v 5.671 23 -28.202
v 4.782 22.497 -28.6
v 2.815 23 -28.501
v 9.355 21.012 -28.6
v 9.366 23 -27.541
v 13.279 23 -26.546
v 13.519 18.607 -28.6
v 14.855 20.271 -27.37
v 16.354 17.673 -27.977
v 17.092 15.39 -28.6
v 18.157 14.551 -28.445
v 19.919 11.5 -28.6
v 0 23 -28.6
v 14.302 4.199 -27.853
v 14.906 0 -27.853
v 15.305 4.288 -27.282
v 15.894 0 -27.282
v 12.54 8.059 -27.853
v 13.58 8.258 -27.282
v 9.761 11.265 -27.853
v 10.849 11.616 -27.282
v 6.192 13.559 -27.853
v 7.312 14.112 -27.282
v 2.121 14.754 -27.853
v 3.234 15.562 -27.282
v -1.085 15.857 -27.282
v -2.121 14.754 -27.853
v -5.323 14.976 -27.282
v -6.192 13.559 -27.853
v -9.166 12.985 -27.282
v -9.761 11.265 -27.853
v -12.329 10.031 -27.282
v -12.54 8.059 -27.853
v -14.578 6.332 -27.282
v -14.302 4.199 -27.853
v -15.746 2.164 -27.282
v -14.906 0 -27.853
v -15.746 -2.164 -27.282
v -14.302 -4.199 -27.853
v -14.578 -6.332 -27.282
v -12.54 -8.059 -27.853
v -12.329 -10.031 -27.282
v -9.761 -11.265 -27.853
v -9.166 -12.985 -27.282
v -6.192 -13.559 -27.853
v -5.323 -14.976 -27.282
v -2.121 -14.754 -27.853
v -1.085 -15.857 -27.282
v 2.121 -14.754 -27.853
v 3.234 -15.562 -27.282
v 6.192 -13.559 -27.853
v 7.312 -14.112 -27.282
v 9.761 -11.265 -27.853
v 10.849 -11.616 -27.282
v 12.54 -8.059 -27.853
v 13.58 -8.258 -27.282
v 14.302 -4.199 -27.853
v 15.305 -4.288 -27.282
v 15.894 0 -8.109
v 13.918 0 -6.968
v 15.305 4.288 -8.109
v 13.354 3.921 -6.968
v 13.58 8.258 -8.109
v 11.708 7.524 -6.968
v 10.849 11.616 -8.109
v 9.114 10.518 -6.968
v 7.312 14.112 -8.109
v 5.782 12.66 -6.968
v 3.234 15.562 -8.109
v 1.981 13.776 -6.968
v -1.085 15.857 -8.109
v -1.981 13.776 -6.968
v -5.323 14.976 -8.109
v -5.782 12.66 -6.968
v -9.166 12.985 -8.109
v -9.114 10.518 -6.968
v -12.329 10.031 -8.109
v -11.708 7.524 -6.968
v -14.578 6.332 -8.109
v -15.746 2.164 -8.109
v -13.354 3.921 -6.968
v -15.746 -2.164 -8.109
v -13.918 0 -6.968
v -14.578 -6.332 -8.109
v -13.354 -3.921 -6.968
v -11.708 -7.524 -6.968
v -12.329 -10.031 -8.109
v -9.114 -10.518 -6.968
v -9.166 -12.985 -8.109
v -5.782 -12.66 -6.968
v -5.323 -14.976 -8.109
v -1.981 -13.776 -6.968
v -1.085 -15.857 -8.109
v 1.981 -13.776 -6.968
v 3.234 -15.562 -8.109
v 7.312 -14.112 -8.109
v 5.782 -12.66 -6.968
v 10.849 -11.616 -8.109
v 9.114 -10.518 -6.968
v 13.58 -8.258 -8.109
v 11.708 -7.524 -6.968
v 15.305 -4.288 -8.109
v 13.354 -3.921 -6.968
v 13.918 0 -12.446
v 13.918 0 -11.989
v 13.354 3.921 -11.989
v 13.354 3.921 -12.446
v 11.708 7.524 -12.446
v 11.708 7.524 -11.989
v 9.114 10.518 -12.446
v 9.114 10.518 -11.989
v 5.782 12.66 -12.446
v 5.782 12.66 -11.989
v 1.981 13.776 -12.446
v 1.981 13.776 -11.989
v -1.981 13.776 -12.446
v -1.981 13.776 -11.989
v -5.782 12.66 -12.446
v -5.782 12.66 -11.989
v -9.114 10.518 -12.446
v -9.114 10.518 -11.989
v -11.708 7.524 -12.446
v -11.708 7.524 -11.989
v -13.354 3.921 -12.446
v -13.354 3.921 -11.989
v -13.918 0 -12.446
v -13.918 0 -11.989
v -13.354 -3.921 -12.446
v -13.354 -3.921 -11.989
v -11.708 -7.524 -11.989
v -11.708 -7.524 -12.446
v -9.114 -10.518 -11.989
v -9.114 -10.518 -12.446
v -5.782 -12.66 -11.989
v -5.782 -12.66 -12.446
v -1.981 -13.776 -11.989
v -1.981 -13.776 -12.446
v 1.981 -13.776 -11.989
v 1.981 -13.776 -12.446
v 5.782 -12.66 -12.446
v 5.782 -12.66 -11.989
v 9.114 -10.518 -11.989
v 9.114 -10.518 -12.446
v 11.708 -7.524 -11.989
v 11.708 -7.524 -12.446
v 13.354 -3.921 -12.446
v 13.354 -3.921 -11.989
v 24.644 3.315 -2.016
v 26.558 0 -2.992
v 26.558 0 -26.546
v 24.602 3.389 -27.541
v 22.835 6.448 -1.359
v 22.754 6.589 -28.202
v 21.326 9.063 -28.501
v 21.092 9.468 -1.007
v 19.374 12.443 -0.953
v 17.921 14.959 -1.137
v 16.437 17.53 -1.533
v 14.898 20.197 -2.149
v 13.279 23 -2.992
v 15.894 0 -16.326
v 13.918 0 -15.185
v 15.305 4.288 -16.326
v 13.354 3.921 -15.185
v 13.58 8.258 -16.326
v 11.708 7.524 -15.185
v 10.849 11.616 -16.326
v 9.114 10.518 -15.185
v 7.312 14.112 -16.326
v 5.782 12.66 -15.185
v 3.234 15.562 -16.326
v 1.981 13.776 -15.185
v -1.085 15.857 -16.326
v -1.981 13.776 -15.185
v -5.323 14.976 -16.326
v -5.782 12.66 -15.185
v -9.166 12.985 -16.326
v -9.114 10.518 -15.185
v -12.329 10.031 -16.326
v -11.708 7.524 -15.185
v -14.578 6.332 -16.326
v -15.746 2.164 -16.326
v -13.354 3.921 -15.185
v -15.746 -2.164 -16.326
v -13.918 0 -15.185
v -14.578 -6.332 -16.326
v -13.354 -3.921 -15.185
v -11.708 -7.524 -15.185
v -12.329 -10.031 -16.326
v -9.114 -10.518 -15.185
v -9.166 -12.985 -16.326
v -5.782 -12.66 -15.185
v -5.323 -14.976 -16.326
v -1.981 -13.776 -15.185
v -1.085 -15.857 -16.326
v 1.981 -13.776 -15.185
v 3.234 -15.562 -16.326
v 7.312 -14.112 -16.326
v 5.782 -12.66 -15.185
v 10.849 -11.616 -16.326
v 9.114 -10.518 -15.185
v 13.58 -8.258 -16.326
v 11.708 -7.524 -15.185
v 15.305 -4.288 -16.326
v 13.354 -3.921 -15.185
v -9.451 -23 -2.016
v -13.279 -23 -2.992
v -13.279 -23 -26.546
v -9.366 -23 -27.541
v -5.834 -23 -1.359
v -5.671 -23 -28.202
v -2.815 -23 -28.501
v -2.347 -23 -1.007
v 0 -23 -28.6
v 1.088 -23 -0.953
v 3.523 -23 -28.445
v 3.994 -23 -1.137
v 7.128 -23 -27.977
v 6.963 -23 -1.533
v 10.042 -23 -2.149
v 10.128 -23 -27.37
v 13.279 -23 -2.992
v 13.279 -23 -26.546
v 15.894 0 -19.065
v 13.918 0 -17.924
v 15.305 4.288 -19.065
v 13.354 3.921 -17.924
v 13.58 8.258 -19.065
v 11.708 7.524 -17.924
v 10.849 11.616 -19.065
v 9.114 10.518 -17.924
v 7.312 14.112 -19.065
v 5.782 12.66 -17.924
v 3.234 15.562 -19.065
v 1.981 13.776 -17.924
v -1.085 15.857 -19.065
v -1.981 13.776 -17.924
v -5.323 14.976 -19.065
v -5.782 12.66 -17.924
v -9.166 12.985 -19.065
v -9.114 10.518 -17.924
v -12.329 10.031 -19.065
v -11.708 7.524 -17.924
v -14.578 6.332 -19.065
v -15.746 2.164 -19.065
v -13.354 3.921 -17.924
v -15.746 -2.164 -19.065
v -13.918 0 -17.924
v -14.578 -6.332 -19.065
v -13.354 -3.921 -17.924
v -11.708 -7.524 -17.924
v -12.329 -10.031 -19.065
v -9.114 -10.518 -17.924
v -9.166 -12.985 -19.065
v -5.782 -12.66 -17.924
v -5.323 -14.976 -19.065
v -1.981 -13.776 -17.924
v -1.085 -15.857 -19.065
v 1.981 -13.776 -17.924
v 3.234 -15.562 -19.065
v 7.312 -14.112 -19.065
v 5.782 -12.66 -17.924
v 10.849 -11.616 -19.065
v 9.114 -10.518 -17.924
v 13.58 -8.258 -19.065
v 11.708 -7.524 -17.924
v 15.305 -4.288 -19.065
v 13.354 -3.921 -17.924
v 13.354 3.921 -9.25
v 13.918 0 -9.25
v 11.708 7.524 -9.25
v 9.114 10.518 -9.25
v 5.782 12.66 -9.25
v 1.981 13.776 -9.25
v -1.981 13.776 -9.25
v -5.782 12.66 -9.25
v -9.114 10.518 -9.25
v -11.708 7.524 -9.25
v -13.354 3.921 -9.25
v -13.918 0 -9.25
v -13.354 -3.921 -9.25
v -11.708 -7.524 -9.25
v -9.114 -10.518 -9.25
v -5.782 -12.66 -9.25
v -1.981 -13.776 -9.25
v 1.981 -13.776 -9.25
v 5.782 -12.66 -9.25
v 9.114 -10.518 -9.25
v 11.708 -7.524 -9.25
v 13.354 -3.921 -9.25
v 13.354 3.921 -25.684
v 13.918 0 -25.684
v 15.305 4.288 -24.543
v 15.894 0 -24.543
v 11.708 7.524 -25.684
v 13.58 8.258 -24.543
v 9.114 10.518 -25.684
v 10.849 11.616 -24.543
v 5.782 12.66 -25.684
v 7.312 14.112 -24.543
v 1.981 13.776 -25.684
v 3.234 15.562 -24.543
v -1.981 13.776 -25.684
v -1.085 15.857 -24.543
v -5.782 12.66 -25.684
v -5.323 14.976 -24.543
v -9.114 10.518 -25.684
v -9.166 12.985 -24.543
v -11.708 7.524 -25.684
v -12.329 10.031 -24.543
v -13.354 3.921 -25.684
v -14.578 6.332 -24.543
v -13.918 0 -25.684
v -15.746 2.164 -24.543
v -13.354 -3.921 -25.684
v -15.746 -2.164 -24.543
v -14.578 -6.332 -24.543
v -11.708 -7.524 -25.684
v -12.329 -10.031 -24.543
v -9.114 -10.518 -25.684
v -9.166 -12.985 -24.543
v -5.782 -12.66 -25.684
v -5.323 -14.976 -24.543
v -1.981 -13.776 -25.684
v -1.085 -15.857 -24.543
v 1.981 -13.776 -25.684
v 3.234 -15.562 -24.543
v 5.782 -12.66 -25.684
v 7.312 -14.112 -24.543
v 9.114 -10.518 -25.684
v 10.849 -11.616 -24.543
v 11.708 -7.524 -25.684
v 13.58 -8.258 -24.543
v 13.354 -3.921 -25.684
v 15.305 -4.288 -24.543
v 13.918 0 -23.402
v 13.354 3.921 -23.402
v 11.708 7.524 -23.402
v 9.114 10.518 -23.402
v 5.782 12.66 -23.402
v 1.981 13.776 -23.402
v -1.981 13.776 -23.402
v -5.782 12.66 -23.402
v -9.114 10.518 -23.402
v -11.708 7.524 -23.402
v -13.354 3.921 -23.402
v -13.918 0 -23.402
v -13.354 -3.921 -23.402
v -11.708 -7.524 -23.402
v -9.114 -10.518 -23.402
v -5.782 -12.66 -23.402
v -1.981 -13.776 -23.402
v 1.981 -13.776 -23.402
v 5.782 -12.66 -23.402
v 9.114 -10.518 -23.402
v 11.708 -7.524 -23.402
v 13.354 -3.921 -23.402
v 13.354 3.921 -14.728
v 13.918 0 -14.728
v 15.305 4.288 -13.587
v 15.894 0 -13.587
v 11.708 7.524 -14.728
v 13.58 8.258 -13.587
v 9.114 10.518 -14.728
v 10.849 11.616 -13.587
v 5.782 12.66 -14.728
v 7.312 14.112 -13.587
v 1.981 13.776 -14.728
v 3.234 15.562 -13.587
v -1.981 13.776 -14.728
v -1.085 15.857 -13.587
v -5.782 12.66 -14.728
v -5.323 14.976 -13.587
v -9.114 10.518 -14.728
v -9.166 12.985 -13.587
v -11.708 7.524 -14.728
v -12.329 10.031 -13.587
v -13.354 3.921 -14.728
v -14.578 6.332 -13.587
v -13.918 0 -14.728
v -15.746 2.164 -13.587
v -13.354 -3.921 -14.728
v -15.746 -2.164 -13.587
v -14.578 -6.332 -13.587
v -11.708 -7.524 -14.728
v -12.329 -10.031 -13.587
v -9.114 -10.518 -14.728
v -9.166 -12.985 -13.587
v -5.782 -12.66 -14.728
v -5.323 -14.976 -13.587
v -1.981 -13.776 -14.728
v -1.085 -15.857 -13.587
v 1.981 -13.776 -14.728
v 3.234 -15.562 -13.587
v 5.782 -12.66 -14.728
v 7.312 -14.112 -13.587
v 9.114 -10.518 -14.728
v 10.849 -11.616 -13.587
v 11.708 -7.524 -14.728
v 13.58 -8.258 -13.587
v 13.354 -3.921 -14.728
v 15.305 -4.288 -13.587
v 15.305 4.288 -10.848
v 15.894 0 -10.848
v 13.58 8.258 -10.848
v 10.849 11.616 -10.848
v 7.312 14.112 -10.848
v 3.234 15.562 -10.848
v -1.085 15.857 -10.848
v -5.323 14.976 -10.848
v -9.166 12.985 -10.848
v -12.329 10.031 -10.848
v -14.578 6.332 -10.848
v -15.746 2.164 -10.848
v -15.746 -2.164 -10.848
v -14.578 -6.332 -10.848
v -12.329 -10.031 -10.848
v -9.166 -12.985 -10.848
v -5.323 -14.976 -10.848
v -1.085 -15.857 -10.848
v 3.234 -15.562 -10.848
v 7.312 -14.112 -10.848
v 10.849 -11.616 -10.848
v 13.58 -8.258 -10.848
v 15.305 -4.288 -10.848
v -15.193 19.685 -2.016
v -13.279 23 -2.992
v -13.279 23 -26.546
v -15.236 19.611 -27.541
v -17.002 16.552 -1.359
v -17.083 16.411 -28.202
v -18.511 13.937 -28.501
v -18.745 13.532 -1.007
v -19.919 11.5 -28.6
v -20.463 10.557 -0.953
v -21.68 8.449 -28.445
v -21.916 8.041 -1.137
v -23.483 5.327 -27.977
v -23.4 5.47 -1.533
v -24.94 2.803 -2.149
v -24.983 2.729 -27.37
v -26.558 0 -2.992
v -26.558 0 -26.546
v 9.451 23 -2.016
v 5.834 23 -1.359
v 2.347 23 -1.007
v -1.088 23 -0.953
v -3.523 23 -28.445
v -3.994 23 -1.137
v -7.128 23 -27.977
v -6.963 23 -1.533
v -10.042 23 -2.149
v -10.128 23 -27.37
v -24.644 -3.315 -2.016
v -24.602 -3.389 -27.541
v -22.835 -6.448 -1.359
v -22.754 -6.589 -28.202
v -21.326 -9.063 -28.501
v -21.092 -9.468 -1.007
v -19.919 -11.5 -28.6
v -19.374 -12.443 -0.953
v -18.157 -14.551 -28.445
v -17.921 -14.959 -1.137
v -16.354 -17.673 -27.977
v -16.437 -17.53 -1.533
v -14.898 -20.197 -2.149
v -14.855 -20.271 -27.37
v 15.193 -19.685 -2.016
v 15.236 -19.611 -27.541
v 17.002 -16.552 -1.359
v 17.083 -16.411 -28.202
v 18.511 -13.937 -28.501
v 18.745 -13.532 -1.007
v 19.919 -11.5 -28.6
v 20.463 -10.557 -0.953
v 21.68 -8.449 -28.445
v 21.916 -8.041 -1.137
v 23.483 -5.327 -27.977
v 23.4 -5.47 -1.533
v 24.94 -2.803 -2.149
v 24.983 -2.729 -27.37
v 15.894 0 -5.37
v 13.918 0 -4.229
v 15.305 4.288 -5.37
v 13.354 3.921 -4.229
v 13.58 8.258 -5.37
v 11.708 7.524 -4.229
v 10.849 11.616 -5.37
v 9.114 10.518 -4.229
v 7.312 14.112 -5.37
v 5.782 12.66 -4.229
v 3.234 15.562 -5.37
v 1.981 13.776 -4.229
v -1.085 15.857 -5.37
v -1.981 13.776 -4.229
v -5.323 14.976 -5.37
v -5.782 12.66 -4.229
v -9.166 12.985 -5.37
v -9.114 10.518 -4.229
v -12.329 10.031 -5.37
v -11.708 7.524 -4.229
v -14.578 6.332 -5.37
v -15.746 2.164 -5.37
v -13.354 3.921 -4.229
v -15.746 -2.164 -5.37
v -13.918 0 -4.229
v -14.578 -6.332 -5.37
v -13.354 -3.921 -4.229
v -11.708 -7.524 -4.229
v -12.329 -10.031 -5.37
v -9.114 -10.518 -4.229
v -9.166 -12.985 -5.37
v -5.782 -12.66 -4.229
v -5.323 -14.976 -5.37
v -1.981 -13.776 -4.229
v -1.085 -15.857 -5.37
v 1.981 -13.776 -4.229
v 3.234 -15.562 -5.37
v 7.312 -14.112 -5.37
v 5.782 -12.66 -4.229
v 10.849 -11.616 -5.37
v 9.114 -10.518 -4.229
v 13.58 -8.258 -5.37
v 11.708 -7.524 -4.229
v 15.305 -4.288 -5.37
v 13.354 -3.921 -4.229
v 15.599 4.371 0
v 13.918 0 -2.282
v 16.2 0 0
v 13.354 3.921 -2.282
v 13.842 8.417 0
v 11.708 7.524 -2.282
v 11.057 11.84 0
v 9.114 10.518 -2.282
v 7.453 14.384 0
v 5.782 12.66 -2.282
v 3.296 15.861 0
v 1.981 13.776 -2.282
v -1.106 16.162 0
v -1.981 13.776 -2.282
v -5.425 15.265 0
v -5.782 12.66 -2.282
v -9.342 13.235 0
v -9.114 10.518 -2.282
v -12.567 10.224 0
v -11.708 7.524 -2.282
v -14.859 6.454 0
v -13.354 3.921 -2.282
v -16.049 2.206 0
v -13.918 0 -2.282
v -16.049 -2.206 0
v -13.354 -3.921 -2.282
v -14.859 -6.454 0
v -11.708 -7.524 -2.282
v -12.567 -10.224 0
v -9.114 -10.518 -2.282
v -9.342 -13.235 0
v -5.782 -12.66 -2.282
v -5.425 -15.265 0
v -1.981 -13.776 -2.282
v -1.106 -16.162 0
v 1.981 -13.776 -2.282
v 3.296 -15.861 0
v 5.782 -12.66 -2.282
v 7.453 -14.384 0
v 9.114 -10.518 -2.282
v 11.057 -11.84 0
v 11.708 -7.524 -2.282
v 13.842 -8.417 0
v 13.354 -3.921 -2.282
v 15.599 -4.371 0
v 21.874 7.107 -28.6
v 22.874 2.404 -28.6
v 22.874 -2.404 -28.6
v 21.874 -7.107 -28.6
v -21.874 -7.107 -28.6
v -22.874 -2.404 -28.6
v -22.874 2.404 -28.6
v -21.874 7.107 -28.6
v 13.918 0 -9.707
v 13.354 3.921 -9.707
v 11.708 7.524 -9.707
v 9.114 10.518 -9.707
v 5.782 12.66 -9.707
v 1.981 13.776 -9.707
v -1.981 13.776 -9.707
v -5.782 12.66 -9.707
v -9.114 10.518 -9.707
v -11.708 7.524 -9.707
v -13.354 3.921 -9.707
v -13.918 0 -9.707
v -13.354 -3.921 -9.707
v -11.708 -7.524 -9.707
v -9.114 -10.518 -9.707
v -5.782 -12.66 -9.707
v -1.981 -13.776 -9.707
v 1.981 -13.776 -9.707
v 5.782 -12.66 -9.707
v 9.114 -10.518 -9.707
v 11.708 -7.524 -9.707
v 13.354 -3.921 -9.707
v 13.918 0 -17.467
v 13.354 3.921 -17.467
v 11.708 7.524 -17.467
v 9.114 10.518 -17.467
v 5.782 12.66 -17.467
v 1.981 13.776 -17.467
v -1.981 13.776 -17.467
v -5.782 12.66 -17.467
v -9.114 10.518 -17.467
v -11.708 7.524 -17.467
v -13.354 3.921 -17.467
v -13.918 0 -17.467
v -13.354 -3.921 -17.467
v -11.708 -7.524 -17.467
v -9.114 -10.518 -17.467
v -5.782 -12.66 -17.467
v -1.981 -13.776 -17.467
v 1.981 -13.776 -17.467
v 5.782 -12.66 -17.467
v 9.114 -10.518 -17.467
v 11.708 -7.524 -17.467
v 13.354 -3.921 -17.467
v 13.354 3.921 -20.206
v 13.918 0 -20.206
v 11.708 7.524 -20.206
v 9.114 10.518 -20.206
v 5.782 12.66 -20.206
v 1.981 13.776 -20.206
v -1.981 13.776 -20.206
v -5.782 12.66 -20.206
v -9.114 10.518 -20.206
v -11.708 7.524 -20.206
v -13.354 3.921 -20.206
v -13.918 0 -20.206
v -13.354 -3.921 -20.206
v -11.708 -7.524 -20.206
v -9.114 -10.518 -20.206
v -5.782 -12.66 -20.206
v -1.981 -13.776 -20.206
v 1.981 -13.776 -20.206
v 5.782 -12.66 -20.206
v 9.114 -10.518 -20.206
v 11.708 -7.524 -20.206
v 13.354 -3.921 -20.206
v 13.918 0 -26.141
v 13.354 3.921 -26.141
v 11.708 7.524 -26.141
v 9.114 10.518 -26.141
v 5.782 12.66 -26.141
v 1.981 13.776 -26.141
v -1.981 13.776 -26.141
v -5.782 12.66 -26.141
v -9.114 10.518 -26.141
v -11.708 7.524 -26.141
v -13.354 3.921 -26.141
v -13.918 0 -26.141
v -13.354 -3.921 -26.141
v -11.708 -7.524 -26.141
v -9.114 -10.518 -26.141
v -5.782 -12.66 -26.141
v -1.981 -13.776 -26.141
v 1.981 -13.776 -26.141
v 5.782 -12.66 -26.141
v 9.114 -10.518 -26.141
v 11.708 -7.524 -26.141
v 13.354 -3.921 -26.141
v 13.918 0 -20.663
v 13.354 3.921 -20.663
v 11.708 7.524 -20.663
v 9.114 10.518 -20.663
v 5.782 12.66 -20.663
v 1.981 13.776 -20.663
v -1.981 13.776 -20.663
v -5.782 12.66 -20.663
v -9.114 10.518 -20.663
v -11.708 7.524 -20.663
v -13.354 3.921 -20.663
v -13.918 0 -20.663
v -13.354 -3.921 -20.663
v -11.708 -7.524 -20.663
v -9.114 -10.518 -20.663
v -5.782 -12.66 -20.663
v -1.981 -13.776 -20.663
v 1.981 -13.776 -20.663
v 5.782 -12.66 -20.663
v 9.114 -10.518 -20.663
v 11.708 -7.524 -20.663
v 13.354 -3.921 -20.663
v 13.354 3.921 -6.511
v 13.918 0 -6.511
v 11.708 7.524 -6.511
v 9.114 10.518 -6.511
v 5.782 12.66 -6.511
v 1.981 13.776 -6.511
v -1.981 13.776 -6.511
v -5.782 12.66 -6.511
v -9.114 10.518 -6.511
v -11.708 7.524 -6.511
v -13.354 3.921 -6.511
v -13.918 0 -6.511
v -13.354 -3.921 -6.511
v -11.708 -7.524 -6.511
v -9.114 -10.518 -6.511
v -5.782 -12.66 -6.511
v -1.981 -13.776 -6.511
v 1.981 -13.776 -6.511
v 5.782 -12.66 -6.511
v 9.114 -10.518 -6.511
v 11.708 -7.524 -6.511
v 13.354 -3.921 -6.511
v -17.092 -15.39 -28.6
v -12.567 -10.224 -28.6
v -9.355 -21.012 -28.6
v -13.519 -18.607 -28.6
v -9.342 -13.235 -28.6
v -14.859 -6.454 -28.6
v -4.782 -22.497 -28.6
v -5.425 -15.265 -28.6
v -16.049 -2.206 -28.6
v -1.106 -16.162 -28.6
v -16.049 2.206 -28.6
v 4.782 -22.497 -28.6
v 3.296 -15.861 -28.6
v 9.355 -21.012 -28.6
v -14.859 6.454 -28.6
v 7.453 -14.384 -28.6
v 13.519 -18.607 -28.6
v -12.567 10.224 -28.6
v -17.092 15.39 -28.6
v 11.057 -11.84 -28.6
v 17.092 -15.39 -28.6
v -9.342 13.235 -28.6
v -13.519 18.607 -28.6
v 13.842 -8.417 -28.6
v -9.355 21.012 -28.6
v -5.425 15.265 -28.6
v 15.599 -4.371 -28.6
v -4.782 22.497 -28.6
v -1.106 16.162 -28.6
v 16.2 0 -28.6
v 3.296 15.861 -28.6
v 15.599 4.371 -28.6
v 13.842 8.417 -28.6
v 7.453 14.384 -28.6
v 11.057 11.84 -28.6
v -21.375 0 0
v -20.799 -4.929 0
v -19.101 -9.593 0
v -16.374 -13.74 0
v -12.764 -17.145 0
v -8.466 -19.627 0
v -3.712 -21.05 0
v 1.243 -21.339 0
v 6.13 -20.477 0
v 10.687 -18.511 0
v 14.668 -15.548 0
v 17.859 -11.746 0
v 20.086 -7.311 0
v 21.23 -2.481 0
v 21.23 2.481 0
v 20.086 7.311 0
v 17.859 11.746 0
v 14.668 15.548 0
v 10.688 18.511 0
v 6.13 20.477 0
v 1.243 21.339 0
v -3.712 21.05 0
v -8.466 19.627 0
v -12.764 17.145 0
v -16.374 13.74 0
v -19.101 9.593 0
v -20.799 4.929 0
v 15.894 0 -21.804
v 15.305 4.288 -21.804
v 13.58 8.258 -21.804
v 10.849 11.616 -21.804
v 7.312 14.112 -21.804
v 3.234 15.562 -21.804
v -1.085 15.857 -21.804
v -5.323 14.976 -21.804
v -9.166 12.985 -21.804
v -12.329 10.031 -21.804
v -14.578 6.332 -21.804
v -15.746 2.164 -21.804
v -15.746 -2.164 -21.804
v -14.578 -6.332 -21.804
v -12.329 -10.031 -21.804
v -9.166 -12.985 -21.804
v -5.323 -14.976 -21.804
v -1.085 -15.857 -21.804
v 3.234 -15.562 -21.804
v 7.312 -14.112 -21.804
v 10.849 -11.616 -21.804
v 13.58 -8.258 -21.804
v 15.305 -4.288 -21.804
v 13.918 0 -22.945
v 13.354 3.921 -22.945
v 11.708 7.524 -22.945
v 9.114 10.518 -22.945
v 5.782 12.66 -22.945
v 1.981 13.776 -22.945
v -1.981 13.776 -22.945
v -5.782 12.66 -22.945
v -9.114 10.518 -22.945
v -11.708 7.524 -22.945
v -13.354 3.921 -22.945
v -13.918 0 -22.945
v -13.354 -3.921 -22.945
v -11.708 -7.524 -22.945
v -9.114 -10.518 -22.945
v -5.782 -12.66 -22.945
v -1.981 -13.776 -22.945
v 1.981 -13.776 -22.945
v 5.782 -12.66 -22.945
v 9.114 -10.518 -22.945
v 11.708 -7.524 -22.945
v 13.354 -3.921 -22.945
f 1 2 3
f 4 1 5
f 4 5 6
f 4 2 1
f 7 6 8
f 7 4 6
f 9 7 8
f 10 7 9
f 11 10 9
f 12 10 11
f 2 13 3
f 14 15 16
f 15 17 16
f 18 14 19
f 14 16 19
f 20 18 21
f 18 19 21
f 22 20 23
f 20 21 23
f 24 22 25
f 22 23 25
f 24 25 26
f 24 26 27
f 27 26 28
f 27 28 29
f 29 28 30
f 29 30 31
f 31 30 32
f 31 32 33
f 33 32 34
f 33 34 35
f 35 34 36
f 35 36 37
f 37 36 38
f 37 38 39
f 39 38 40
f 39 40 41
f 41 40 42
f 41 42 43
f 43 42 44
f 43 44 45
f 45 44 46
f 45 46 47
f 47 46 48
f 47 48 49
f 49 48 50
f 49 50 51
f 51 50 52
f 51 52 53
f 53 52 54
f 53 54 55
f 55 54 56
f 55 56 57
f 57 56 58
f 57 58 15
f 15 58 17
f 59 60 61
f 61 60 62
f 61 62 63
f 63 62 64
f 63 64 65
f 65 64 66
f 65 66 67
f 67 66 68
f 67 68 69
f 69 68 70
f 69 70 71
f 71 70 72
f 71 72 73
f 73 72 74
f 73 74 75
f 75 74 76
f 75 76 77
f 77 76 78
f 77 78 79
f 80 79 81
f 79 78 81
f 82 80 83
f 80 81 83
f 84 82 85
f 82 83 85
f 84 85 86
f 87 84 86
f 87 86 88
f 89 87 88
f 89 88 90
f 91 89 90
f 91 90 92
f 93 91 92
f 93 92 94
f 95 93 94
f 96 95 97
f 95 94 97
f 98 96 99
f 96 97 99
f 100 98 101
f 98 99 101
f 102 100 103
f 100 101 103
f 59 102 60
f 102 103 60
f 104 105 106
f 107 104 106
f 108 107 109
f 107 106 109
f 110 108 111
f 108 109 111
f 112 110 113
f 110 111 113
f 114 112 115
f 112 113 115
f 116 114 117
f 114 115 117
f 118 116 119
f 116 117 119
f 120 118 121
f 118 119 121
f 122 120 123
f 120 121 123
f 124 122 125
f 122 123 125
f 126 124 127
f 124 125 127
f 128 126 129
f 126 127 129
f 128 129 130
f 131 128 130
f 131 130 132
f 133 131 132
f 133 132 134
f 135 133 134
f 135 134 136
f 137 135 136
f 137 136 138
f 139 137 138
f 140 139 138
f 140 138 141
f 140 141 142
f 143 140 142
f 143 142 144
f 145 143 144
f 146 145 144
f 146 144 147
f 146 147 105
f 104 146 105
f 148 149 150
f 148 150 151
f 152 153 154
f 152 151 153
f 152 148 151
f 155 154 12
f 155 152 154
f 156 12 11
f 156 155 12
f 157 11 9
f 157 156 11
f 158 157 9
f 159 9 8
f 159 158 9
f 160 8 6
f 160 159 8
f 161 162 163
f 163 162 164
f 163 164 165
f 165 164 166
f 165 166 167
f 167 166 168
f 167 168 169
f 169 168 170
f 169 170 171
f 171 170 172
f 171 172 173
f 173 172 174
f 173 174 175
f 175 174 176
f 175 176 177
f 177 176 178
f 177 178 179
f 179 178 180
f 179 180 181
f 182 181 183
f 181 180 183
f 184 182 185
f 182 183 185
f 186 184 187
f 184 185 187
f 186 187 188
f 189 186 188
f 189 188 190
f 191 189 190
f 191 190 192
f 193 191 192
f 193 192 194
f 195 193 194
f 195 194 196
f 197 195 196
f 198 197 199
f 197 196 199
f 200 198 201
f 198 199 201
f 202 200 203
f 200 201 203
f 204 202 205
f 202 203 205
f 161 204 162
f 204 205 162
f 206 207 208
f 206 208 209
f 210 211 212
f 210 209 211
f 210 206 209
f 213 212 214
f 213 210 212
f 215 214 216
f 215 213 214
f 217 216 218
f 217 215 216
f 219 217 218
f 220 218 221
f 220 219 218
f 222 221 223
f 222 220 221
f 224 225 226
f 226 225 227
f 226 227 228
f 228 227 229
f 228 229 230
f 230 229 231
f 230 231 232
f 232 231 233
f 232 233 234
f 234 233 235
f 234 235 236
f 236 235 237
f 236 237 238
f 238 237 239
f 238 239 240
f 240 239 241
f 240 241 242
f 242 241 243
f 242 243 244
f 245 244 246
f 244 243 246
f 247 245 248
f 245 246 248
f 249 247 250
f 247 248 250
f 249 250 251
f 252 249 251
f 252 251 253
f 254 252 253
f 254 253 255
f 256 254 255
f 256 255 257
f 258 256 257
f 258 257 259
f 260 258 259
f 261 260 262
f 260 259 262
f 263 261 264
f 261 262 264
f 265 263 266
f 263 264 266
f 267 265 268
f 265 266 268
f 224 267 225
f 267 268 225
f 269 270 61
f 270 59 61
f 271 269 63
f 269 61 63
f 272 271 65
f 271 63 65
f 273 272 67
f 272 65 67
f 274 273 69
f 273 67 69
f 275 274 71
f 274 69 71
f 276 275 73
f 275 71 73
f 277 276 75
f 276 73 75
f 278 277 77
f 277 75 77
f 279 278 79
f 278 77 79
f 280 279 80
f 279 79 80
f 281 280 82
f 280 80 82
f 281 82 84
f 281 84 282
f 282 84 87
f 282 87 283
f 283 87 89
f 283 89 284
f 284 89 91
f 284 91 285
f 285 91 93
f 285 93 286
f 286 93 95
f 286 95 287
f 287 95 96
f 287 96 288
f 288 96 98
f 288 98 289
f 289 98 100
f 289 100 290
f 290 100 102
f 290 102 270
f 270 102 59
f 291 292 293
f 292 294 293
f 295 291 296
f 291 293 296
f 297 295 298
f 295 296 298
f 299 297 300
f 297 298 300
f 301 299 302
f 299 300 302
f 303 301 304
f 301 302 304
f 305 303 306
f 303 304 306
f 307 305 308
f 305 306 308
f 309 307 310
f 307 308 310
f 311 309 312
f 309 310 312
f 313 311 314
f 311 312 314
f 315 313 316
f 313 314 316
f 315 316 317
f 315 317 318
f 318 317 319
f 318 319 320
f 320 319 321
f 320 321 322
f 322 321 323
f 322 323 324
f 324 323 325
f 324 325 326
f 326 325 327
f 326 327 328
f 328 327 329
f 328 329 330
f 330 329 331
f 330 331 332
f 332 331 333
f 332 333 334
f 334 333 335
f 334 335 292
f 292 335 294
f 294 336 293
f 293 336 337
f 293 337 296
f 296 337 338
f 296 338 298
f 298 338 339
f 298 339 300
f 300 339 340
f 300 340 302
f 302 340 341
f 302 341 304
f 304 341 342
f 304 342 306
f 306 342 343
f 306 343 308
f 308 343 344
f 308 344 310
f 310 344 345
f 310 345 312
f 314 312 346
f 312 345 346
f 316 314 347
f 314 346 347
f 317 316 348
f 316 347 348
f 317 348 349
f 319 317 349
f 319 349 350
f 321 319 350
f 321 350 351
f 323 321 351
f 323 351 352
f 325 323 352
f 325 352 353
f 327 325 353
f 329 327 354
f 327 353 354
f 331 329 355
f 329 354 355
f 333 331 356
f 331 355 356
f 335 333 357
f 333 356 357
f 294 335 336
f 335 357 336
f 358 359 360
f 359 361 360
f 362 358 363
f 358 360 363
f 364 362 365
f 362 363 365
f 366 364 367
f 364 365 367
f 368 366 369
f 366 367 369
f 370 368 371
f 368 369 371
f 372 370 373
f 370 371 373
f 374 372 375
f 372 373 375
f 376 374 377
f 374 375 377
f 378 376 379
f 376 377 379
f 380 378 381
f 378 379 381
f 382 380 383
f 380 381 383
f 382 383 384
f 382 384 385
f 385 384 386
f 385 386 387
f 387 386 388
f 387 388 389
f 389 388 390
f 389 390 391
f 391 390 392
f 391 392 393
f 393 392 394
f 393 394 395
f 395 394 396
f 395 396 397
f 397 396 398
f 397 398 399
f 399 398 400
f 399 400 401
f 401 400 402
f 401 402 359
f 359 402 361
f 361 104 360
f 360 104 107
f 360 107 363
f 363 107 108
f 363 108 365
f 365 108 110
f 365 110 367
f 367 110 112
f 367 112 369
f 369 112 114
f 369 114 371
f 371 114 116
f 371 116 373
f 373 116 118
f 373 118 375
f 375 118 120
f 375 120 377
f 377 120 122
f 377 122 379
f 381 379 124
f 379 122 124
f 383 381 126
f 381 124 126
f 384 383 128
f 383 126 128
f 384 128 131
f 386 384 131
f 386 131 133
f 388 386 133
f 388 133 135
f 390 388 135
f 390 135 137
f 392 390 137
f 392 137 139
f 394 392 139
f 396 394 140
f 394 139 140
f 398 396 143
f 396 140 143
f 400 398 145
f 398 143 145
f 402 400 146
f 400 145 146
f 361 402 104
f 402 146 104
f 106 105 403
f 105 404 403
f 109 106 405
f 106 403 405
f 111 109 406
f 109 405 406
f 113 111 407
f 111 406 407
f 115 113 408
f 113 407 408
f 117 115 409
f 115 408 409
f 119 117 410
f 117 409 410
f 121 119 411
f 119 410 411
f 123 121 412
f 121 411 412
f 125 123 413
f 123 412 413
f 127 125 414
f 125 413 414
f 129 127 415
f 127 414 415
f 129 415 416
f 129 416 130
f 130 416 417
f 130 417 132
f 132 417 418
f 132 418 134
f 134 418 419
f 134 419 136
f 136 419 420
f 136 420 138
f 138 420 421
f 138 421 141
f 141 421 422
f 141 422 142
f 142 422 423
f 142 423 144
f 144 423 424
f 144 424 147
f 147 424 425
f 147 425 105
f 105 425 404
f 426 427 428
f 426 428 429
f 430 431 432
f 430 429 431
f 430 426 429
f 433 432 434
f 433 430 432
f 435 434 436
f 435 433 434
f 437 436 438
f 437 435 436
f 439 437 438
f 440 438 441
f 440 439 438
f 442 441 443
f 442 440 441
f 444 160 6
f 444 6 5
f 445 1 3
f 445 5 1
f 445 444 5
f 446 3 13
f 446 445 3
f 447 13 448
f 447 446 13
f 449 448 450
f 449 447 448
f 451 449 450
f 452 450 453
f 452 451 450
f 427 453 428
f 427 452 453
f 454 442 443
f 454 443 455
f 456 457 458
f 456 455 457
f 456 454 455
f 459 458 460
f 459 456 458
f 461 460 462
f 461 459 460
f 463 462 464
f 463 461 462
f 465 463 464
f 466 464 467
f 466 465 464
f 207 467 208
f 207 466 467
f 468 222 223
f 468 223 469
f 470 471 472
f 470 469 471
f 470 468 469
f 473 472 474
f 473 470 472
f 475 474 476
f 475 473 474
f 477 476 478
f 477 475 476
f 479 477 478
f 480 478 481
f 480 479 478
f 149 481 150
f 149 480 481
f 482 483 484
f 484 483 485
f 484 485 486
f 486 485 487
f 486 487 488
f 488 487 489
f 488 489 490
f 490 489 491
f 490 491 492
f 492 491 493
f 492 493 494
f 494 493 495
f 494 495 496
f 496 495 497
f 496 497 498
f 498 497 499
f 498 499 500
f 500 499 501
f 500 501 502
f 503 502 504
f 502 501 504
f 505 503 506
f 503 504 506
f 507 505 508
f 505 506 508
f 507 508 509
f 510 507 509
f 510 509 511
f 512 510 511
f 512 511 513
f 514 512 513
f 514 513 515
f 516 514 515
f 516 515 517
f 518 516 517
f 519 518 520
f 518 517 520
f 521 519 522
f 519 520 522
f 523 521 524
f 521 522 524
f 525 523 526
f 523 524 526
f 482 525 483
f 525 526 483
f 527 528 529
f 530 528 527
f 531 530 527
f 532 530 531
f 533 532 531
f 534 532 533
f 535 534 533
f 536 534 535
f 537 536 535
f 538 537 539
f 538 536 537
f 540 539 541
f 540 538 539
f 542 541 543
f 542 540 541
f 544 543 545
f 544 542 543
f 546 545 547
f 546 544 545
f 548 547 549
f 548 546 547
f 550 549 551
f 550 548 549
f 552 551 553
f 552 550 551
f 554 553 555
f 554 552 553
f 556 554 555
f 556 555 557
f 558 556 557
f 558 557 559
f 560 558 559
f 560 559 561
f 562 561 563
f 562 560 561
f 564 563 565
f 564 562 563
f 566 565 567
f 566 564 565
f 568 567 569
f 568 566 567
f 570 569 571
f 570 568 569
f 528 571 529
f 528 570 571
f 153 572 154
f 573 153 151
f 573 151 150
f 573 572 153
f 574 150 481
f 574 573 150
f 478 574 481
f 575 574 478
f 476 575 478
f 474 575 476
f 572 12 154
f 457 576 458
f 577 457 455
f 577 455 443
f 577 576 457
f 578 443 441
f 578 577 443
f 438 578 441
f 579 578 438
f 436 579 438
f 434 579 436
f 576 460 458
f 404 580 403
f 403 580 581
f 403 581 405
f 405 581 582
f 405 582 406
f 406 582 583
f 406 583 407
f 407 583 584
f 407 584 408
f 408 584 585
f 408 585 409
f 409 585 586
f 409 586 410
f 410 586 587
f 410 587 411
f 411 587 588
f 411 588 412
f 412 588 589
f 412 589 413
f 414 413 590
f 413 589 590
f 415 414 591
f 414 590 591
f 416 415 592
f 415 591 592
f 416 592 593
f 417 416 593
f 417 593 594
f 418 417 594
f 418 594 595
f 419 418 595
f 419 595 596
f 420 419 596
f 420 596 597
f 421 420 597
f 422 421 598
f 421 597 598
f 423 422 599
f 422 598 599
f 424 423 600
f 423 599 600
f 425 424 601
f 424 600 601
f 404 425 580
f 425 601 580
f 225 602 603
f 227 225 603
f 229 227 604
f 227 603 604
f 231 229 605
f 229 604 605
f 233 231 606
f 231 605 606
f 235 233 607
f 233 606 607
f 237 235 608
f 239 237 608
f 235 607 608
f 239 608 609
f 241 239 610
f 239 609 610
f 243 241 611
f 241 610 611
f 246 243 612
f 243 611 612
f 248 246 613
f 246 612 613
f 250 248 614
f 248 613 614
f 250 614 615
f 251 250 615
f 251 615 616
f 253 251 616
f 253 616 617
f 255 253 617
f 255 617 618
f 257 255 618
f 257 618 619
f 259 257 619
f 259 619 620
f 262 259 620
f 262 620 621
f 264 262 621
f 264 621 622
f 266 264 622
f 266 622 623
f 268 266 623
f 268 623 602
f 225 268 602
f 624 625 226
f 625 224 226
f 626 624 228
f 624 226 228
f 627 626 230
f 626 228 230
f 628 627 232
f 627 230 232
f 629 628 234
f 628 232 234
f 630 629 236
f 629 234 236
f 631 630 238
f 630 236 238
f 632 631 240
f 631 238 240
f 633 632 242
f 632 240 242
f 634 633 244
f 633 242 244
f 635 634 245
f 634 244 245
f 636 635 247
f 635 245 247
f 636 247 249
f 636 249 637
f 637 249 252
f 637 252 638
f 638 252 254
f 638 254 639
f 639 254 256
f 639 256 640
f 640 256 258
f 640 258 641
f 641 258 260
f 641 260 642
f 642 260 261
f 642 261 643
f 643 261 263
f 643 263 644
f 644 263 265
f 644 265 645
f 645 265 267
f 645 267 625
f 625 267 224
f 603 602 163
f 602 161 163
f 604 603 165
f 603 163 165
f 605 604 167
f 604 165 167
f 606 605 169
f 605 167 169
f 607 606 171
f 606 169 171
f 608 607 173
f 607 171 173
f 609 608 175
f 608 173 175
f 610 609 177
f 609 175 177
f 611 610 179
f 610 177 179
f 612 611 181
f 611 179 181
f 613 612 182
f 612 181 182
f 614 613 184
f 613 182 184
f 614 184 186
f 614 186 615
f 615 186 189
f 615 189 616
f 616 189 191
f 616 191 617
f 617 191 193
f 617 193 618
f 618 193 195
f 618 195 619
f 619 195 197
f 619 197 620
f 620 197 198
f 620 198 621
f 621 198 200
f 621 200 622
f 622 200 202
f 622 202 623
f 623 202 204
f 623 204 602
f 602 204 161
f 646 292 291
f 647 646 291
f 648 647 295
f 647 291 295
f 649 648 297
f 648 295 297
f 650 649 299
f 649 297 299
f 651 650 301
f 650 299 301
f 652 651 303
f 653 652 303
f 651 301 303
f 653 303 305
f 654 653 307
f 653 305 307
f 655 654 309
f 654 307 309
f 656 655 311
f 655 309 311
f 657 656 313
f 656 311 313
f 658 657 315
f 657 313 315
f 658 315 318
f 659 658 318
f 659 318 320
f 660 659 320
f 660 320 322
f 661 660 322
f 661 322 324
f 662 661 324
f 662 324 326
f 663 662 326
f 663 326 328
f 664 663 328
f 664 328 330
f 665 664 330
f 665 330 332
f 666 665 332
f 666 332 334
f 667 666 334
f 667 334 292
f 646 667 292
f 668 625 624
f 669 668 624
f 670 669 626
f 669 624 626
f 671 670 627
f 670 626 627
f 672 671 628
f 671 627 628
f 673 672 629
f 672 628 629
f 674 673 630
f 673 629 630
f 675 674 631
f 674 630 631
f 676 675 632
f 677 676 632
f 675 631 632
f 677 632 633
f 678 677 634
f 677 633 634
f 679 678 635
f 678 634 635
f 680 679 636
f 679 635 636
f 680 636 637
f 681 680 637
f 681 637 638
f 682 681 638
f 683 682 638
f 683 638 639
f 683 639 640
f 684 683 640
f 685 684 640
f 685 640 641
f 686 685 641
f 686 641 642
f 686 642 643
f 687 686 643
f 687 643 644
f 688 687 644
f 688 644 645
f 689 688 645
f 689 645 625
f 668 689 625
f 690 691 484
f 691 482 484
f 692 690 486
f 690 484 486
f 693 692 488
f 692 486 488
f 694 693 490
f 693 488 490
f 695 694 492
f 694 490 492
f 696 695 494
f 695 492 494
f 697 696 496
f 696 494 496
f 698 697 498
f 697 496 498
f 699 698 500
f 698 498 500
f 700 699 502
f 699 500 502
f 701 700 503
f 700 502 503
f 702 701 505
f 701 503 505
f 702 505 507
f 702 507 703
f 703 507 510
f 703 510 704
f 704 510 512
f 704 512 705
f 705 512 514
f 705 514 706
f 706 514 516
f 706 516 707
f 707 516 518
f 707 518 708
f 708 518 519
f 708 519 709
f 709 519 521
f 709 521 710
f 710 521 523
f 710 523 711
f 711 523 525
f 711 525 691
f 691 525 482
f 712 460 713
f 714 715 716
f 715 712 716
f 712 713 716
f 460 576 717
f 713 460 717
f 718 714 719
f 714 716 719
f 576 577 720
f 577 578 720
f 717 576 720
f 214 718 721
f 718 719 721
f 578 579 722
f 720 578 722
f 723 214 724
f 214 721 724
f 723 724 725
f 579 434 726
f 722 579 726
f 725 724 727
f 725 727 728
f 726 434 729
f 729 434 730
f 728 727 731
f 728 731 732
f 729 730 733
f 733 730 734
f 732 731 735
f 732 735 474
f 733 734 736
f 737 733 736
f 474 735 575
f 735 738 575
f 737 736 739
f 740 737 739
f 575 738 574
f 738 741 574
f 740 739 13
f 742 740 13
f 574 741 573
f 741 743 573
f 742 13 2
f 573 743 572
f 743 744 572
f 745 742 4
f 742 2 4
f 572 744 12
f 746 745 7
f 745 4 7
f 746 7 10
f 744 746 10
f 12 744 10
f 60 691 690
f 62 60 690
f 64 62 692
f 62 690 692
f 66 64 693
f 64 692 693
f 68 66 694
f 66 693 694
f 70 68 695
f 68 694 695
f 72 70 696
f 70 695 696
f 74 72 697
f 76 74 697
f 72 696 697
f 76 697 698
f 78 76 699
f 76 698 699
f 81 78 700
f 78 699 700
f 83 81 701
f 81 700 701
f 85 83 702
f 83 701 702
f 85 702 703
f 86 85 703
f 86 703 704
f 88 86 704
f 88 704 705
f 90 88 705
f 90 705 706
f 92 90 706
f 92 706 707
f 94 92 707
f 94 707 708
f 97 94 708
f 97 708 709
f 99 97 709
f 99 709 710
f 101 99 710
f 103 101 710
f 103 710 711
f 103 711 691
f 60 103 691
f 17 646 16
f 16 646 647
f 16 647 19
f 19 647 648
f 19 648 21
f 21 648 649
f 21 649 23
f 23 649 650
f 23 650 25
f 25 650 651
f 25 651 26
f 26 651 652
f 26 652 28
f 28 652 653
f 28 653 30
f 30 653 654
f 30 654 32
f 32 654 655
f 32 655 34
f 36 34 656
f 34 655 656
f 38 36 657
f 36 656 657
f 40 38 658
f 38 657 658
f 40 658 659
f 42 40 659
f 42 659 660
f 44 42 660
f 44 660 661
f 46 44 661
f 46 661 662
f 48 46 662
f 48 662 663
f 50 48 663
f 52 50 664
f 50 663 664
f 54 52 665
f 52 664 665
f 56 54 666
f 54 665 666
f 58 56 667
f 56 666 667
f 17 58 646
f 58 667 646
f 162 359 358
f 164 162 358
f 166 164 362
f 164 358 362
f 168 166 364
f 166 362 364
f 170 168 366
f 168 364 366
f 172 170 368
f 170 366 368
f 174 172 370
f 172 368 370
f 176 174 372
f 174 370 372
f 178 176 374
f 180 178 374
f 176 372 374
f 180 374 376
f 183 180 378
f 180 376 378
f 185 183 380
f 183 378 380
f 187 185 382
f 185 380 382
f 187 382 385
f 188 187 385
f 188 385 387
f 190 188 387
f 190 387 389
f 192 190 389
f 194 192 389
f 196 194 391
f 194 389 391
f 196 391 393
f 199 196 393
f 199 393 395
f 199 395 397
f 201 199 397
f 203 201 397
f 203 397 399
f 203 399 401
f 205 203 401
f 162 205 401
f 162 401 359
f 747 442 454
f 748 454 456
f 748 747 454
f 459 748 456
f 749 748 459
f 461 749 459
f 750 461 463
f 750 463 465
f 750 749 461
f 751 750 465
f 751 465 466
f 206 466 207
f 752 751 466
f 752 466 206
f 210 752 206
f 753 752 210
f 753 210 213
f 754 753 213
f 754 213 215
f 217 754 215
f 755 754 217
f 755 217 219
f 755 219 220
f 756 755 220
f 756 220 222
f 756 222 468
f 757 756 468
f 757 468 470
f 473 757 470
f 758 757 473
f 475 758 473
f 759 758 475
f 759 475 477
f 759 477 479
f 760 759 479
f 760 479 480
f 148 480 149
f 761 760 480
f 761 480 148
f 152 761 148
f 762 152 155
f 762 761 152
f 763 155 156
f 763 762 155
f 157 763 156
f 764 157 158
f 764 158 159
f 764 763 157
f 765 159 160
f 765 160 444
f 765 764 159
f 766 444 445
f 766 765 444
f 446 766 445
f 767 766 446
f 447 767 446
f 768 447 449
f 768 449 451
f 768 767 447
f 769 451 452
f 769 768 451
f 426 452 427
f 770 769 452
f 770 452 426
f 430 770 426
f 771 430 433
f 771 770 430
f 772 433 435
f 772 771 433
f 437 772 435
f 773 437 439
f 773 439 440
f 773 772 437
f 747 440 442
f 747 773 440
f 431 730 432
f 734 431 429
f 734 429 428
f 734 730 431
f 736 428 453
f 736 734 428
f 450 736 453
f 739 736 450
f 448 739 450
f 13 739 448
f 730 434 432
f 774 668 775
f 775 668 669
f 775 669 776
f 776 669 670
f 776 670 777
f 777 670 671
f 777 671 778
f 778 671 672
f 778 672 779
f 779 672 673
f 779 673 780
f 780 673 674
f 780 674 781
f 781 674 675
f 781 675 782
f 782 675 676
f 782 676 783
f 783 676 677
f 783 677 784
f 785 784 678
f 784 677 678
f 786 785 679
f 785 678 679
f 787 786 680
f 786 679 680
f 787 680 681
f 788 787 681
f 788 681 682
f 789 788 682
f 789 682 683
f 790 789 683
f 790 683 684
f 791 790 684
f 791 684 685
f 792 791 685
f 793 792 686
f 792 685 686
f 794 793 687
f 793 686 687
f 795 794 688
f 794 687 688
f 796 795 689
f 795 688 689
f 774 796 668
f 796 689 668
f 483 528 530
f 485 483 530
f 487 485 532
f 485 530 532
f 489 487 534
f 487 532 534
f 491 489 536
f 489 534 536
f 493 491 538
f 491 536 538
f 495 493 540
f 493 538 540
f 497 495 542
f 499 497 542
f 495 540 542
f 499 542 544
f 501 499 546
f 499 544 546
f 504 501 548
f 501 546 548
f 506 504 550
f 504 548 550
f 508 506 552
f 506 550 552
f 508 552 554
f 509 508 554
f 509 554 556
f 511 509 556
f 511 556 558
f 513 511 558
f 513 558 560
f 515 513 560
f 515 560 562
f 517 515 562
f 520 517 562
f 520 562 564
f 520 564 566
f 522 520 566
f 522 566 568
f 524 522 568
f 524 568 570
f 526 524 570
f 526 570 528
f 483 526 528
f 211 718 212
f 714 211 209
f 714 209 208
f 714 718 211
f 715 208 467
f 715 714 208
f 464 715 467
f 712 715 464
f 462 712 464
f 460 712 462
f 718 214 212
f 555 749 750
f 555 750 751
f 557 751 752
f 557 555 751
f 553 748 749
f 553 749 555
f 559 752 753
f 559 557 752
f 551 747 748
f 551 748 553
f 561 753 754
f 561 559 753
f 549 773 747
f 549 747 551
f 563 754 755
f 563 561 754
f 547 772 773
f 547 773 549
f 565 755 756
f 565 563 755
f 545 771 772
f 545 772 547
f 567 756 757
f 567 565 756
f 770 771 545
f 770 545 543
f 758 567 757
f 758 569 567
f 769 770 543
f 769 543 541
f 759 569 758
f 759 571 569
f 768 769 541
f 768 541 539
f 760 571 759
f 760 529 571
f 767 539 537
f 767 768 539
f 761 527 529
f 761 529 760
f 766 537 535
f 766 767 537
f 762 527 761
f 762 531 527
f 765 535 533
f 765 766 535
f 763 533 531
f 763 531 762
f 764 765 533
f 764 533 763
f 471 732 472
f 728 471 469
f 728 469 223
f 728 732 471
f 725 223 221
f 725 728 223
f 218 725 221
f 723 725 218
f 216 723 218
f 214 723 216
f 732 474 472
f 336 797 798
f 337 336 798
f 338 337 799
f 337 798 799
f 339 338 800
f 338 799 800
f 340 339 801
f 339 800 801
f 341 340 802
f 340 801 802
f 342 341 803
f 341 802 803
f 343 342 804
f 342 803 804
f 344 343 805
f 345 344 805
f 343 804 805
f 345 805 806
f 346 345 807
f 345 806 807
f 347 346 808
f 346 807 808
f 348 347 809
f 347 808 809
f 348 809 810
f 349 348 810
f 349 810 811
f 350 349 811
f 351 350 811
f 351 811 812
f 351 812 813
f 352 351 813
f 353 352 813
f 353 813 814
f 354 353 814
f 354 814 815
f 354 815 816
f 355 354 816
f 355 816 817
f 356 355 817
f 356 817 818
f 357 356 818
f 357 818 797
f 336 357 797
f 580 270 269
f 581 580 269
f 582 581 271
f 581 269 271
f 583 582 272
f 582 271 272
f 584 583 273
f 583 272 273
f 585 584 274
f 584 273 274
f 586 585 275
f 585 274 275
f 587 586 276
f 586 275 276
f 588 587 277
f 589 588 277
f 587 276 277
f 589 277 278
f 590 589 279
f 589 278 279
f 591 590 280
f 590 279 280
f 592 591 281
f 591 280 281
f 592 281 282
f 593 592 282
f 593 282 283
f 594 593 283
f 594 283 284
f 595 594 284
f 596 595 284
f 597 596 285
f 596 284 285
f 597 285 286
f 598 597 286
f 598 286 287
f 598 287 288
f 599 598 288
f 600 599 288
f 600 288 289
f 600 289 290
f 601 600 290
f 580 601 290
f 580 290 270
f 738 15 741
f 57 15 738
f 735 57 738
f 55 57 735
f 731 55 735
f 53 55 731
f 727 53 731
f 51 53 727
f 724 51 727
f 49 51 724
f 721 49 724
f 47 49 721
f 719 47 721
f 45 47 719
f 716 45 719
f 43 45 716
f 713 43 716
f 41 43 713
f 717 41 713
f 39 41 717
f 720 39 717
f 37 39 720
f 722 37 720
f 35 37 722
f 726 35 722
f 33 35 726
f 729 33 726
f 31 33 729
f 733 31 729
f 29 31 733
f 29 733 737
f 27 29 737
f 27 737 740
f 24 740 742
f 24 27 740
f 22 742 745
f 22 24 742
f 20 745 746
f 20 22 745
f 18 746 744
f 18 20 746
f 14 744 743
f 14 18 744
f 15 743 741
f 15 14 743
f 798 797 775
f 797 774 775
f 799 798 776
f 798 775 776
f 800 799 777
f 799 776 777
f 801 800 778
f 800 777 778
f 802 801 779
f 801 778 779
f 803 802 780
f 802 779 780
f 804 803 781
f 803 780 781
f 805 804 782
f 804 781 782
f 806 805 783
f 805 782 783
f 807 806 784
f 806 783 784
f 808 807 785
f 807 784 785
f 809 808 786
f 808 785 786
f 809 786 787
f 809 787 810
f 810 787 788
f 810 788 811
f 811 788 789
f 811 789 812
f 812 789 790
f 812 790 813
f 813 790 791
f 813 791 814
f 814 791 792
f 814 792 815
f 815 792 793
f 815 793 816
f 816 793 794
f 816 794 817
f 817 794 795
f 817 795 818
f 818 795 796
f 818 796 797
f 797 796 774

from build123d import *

# Parameters (mm, degrees)
SKETCH1_R        = 13.9175
BASENUT_DEPTH    = 28.6
ENDCHAMFER2_SIZE = 2.2825
LPATTERN10_COUNT = 9
LPATTERN10_PITCH = 2.739


with BuildPart() as part:
    # Sketch1 → BaseNut (new body)
    with BuildSketch(Plane.XY):
        Polygon((13.279056191, -23), (26.558112383, 0), (13.279056191, 23), (-13.279056191, 23), (-26.558112383, 0), (-13.279056191, -23), align=None)
        Circle(SKETCH1_R, mode=Mode.SUBTRACT)
    extrude(amount=-BASENUT_DEPTH)

    # Sketch2 → Chamfer1 (revolve, cut)
    with BuildSketch(Plane(origin=(15.04811501, 0, -16.706149795), x_dir=(0, 0, -1), z_dir=(0, 1, 0))):
        Polygon((9.839573063, 41.606227393), (11.893850205, 38.04811501), (11.893850205, 41.606227393), align=None)
    revolve(axis=Axis((0, 0, 7.016501752), (0, 0, -1)), mode=Mode.SUBTRACT)

    # Sketch6 → EndChamfer1 (revolve, cut)
    with BuildSketch(Plane(origin=(-9.197458863, 0, -10.252541137), x_dir=(0, 0, 1), z_dir=(0, 1, 0))):
        Polygon((-18.347458863, 23.114958863), (-18.347458863, 25.397458863), (-17.029656873, 23.114958863), align=None)
    revolve(axis=Axis((0, 0, 13.104863586), (0, 0, -1)), mode=Mode.SUBTRACT)

    # Sketch5 → Chamfer2 (revolve, cut)
    with BuildSketch(Plane(origin=(-14.793032735, 0, -16.96123207), x_dir=(0, 0, 1), z_dir=(0, 1, 0)), mode=Mode.PRIVATE) as chamfer2_sk:
        Polygon((16.96123207, 36.168032735), (16.96123207, 41.351145118), (13.968760741, 41.351145118), align=None)
    revolve(chamfer2_sk.sketch.rotate(Axis((0, 0, -39.536013381), (0, 0, 1)), 180), axis=Axis((0, 0, -39.536013381), (0, 0, 1)), mode=Mode.SUBTRACT)

    # EndChamfer2
    endchamfer2_edges = [part.edges().sort_by_distance(p)[0] for p in [
        (-13.9175, 0, 0),
    ]]
    chamfer(endchamfer2_edges, length=ENDCHAMFER2_SIZE)

    # Sketch7 → Cut-Revolve10 (revolve, cut)
    with BuildSketch(Plane(origin=(0, 0, 0), x_dir=(1, 0, 0), z_dir=(0, 1, 0))):
        Polygon((11.635, 28.423448011), (13.9175, 28.423448011), (15.894202984, 27.282198011), (13.9175, 26.140948011), (11.635, 26.140948011), align=None)
    cut_revolve10 = revolve(axis=Axis((0, 0, -48.618332322), (0, 0, 1)), mode=Mode.SUBTRACT)

    # LPattern10: Cut-Revolve10 ×9
    with Locations(*[(0, 0, i * LPATTERN10_PITCH) for i in range(1, LPATTERN10_COUNT)]):
        add(cut_revolve10, mode=Mode.SUBTRACT)


solid = part.part
